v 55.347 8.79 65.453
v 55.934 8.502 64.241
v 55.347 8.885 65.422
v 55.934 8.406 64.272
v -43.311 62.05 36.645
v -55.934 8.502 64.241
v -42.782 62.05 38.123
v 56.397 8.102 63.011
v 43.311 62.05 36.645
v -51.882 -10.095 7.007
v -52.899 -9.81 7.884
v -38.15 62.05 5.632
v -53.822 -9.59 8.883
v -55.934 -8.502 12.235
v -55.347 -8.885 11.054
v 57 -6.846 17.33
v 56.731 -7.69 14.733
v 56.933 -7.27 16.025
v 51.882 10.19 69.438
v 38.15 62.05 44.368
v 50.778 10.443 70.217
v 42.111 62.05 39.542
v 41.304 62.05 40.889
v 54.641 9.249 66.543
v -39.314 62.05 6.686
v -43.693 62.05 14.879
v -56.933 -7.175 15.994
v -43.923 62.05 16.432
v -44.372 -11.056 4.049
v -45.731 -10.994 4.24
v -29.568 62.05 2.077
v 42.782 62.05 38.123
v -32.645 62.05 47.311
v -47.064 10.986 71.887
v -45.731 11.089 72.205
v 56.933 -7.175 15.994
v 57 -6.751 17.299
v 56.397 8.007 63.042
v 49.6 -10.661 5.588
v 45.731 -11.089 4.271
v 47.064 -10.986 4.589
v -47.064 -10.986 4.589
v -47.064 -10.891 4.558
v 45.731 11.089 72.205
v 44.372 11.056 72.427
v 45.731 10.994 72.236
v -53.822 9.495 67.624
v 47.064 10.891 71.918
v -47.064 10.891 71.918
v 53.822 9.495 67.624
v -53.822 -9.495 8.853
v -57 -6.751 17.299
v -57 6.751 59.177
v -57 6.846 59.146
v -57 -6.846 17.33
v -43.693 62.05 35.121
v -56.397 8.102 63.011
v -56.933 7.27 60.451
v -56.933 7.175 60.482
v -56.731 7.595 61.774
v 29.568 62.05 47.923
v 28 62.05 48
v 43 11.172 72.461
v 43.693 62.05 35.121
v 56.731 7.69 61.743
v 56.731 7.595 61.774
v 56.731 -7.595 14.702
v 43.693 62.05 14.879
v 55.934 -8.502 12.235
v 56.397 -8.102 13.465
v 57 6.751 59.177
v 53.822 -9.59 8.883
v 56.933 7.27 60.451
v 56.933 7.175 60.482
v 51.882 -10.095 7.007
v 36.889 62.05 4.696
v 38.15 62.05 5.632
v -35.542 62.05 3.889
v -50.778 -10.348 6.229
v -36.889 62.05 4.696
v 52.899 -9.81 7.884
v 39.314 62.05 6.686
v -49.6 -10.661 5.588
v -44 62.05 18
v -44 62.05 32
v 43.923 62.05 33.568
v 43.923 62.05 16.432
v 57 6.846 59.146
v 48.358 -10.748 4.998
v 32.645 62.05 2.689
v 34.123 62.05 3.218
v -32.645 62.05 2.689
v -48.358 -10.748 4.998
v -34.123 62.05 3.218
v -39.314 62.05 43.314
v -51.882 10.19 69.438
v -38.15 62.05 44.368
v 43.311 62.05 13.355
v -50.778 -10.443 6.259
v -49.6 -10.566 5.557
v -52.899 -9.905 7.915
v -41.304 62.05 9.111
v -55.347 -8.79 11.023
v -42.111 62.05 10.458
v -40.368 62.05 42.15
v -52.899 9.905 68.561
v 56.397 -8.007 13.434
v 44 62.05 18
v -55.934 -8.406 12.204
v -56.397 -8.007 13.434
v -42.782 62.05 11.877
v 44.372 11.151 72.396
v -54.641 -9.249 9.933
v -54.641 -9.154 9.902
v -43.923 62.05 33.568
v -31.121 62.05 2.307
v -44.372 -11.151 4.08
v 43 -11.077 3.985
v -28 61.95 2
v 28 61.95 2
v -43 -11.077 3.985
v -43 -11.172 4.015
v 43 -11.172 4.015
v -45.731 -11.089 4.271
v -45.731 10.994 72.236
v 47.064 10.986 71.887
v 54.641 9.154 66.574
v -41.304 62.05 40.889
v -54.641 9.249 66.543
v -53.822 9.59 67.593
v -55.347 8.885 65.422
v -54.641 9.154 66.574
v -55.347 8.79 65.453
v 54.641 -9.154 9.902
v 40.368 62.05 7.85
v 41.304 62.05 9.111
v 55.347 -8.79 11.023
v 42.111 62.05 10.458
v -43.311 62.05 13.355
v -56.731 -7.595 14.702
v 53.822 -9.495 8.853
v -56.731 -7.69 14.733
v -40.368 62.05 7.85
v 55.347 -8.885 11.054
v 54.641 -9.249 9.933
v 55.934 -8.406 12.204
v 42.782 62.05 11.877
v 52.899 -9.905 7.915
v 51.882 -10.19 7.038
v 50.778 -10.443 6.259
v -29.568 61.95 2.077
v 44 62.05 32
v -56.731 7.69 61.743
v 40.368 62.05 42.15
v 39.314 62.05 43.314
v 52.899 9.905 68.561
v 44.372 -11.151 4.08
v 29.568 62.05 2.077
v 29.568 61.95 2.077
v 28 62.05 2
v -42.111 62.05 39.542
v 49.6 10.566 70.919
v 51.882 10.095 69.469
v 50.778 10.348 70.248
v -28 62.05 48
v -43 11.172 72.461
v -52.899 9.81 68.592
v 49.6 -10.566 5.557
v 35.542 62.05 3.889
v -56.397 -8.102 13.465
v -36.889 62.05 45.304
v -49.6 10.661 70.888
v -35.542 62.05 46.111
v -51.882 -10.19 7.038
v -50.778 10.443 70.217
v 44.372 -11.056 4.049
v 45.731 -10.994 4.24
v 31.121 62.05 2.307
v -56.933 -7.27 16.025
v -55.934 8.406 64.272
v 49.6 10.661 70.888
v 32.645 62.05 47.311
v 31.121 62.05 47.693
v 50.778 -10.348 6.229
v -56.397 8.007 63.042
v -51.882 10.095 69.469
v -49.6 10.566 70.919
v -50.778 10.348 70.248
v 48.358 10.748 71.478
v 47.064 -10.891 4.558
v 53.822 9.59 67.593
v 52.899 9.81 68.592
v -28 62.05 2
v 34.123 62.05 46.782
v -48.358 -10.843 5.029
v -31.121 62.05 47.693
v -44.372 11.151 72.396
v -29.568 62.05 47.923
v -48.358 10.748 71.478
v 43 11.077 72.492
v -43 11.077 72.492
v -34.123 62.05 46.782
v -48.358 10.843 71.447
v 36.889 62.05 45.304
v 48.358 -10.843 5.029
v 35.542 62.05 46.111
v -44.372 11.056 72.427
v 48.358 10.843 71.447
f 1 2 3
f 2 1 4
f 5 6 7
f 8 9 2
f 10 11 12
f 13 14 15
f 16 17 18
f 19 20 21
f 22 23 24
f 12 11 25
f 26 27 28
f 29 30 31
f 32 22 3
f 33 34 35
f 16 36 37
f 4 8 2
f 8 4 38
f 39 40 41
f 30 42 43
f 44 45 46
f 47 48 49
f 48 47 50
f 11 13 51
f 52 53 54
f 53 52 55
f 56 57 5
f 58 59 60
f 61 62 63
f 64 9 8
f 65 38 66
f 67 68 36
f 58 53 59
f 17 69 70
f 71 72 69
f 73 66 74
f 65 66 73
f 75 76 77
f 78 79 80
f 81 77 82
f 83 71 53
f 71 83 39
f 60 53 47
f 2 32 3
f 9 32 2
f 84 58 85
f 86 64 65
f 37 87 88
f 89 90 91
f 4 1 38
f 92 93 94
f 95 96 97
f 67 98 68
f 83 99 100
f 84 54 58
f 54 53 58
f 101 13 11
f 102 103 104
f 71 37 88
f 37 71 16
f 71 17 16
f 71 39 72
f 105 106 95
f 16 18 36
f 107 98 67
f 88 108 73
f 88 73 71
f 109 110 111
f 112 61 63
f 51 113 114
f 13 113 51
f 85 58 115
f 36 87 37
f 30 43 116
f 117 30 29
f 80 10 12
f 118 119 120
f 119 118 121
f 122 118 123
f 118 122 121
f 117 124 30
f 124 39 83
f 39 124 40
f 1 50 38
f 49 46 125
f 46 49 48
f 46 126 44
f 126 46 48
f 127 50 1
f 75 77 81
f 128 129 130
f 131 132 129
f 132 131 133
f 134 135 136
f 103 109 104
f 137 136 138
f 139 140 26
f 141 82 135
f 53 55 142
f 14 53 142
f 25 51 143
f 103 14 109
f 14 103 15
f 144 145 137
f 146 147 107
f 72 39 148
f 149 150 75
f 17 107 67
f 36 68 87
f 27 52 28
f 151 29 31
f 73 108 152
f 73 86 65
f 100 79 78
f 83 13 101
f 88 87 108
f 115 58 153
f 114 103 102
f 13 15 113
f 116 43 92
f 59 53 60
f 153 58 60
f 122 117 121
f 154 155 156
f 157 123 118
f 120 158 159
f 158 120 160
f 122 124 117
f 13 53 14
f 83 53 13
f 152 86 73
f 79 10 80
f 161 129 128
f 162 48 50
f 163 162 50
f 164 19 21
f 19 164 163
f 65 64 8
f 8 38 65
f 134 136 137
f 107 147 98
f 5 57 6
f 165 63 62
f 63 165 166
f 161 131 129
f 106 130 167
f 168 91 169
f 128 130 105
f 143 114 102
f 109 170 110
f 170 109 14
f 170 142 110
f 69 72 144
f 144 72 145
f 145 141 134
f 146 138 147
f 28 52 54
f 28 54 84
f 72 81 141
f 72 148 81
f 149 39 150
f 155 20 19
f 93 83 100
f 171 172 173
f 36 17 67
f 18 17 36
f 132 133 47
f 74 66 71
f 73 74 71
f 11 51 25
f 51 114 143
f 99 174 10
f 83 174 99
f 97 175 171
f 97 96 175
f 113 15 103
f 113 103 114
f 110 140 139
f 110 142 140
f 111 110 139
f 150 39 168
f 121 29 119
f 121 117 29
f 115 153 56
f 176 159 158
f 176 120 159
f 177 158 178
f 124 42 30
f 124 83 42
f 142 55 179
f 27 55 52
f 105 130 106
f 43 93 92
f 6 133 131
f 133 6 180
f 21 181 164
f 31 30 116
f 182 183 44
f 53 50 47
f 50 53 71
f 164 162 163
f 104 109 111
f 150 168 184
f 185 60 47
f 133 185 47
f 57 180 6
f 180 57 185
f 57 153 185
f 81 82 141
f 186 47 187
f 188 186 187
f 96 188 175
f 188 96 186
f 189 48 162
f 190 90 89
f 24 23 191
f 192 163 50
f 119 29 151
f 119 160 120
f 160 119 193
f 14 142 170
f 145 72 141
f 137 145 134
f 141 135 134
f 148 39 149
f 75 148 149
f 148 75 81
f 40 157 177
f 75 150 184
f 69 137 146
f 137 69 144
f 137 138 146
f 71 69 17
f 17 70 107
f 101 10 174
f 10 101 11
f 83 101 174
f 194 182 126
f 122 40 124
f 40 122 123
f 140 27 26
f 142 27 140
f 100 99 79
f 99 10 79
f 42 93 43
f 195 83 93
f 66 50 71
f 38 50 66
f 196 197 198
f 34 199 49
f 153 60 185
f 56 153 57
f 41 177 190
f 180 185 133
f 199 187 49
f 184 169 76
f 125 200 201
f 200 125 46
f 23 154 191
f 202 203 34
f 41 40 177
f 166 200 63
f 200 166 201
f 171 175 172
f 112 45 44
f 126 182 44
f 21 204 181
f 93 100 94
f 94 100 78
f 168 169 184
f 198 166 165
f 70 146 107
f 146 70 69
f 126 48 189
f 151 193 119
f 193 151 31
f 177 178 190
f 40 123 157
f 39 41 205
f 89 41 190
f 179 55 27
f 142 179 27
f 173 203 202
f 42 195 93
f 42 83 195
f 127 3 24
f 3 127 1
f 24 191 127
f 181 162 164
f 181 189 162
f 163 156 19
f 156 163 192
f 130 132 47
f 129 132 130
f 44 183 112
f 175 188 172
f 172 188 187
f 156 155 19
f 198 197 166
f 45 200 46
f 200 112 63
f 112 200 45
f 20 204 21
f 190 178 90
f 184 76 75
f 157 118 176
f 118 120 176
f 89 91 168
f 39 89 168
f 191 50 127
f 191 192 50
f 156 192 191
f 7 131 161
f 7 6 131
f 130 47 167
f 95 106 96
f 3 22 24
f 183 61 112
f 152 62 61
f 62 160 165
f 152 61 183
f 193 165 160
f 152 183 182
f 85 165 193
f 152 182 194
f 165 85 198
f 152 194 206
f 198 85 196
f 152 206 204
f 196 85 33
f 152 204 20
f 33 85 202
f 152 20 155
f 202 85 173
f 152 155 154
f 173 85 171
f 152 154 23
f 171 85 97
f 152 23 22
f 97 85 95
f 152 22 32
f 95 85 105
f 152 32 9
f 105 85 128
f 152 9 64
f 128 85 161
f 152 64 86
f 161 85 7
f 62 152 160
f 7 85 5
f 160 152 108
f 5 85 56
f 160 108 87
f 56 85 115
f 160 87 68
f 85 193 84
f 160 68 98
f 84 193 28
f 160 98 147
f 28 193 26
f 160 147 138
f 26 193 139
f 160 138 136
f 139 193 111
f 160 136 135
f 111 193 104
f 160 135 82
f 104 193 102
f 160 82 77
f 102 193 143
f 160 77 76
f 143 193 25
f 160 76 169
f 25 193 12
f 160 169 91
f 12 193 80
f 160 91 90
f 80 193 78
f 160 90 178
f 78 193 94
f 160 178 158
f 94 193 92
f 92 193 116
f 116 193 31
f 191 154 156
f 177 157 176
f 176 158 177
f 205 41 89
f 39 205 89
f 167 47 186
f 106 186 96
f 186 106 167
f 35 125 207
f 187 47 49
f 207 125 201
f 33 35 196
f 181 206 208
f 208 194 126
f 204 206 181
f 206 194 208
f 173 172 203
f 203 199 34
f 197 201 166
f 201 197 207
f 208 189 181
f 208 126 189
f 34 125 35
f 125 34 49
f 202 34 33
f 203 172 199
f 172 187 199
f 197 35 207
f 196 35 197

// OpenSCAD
$fn = 64;

larg_f = 114.0;
alt_f  = 72.0;
r_f    = 14.0;
ang    = 18.0;

prof   = 62.0;
wall   = 2.8;

larg_t = 88.0;
alt_t  = 46.0;
r_t    = 16.0;

module rounded_rect(w, h, r) {
    minkowski() {
        square([max(0.1, w - 2*r), max(0.1, h - 2*r)], center=true);
        circle(r=r);
    }
}

zc_f = (alt_f/2) * sin(90 - ang) + 4.0;

// Teste de corte plano a Z=0
module corpo_base_plana_direta() {
    difference() {
        // Envoltoria exterior
        intersection() {
            hull() {
                // Face frontal inclinada
                translate([0, 0, zc_f])
                rotate([90 - ang, 0, 0])
                linear_extrude(0.1, center=true)
                rounded_rect(larg_f, alt_f, r_f);

                // Traseira
                translate([0, prof, (alt_t/2) + 2.0])
                rotate([90, 0, 0])
                linear_extrude(0.1, center=true)
                rounded_rect(larg_t, alt_t, r_t);
            }
            // Corte plano a Z >= 0 (tudo o que esta abaixo de Z=0 e cortado fora!)
            translate([0, prof/2, 50])
            cube([larg_f + 20, prof + 40, 100], center=true);
        }
    }
}

corpo_base_plana_direta();
